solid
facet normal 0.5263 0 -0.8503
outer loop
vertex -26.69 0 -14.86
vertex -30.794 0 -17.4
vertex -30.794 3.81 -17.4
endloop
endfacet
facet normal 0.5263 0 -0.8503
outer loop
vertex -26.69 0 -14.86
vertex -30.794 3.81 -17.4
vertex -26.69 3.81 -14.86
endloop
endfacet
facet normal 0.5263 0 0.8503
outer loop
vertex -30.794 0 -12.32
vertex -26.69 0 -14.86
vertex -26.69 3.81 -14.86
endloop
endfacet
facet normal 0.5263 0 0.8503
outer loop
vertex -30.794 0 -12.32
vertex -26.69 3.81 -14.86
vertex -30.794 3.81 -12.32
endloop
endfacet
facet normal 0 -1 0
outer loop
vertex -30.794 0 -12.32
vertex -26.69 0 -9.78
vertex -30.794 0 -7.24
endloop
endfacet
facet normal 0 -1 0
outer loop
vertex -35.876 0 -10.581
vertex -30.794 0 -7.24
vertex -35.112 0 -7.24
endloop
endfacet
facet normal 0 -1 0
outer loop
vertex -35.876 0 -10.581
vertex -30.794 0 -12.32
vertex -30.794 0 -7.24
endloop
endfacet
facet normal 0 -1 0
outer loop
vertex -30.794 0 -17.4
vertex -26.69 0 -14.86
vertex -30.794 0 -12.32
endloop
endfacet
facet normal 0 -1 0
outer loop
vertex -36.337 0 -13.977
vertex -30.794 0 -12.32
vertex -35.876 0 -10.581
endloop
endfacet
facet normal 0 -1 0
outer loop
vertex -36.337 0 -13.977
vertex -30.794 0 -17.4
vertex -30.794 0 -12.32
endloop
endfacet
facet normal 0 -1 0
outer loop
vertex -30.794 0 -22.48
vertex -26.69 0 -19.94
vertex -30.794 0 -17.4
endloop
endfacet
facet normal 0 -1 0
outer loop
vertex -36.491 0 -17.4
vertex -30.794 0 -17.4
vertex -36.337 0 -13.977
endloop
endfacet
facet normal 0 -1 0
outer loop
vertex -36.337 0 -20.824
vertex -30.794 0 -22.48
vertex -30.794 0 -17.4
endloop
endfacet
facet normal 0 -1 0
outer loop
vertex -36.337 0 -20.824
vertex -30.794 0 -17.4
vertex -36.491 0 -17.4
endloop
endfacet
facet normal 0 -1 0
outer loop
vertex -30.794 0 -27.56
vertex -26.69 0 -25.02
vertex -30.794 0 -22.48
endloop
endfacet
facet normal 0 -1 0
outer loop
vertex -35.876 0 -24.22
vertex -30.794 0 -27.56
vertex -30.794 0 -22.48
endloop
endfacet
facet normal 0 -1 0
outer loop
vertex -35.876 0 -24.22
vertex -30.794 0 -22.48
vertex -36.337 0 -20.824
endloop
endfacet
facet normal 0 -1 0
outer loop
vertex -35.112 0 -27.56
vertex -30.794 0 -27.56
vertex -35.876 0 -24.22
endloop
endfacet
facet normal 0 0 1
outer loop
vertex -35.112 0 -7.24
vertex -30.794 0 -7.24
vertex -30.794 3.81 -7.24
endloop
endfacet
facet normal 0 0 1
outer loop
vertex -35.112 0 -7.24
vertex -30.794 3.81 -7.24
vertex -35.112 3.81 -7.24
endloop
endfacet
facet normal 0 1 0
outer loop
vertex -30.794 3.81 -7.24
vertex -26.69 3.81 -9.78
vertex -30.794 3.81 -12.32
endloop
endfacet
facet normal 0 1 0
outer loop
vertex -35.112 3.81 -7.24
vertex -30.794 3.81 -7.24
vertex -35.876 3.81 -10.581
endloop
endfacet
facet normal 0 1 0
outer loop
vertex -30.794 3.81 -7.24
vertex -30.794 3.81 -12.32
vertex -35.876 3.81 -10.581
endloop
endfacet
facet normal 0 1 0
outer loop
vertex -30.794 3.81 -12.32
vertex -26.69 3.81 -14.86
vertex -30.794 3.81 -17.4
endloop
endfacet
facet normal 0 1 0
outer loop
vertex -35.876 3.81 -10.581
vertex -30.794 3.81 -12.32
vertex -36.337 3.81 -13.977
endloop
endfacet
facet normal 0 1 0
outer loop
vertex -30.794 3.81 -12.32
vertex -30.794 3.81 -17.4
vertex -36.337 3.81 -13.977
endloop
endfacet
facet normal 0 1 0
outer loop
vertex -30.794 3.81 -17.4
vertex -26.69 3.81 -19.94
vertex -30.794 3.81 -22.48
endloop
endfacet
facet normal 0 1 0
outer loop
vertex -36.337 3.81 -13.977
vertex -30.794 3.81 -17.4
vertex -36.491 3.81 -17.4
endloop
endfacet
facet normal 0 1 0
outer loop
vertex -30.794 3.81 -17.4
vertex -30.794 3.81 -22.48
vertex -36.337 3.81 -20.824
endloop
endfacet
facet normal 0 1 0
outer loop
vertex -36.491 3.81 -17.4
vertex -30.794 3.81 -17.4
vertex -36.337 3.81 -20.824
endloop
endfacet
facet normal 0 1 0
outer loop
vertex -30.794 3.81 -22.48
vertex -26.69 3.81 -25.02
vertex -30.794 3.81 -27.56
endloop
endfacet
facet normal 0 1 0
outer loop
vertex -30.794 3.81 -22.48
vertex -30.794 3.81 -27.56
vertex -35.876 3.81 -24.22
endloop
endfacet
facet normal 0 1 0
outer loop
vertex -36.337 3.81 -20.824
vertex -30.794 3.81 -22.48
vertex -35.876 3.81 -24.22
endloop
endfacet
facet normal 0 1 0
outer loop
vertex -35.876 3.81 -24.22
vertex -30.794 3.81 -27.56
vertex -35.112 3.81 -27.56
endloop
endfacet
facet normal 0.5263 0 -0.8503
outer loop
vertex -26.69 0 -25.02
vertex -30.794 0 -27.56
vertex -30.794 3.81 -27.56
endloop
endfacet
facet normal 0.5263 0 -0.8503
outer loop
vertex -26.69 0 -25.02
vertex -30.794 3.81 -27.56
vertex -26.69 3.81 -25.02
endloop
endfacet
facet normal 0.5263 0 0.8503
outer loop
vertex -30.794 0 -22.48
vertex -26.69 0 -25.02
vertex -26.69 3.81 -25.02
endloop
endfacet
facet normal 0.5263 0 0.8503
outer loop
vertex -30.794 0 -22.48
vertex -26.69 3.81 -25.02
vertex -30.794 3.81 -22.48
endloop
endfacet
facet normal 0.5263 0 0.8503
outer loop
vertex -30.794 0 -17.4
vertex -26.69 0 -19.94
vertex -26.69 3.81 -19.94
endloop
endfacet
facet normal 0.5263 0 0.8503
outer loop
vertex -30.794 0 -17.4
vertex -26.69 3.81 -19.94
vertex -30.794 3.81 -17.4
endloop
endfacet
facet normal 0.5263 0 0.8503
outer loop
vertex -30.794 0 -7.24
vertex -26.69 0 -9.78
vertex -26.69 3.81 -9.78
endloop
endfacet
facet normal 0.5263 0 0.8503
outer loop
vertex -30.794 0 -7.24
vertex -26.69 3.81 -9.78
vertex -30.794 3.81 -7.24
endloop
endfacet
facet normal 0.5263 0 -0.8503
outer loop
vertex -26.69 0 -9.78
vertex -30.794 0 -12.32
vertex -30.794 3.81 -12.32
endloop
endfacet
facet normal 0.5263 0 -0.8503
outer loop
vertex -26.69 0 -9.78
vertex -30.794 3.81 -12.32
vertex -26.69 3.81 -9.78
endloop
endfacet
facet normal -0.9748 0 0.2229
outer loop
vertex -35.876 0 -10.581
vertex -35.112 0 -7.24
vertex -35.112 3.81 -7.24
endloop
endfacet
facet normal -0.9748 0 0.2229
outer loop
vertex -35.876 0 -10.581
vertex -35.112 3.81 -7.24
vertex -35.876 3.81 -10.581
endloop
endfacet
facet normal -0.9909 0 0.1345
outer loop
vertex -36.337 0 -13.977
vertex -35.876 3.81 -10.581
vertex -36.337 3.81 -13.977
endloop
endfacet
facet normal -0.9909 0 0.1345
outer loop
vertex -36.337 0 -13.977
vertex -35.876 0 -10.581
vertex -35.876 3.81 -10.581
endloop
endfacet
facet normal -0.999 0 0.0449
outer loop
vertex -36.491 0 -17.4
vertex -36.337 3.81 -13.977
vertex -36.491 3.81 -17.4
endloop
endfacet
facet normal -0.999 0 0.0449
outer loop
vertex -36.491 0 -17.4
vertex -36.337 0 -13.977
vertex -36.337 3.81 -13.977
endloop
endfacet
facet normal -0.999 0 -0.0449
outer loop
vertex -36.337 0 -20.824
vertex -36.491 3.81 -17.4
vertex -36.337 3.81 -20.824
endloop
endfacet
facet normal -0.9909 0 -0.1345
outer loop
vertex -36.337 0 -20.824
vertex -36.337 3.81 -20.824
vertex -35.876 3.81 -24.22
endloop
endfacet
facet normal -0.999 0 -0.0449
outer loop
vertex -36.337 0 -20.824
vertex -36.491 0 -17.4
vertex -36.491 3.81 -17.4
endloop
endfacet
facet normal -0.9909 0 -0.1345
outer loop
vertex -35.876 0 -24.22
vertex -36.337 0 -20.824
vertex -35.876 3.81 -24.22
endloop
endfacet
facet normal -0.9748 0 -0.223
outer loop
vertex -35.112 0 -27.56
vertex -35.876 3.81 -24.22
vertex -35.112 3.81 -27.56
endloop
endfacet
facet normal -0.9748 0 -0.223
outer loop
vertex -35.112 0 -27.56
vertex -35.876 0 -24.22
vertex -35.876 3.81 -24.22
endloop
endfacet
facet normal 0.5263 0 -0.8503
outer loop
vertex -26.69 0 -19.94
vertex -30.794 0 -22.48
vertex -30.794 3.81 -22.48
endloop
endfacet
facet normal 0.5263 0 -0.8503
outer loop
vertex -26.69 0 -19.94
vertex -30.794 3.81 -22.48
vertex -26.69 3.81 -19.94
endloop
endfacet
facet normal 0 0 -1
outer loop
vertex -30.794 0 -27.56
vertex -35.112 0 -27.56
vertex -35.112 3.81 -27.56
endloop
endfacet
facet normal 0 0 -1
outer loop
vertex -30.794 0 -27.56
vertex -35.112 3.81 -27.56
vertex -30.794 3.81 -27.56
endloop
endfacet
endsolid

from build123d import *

# Parameters (mm, degrees)
BOSS_EXTRUDE1_DEPTH = 3.81


with BuildPart() as part:
    # Sketch1 → Boss-Extrude1 (new body)
    with BuildSketch(Plane(origin=(0, 0, 0), x_dir=(1, 0, 0), z_dir=(0, 1, 0))):
        with BuildLine():
            Line((-30.793742763, 27.560180372), (-26.69024718, 25.020180372))
            Line((-26.69024718, 25.020180372), (-30.793742763, 22.480180372))
            Line((-30.793742763, 22.480180372), (-26.69024718, 19.940180372))
            Line((-26.69024718, 19.940180372), (-30.793742763, 17.400180372))
            Line((-30.793742763, 17.400180372), (-26.69024718, 14.860180372))
            Line((-26.69024718, 14.860180372), (-30.793742763, 12.320180372))
            Line((-30.793742763, 12.320180372), (-26.69024718, 9.780180372))
            Line((-26.69024718, 9.780180372), (-30.793742763, 7.240180372))
            Line((-30.793742763, 7.240180372), (-35.111742763, 7.240180372))
            ThreePointArc((-35.111742763, 7.240180372), (-36.491388734, 17.400180372), (-35.111742763, 27.560180372))
            Line((-35.111742763, 27.560180372), (-30.793742763, 27.560180372))
        make_face()
    extrude(amount=BOSS_EXTRUDE1_DEPTH)


solid = part.part
